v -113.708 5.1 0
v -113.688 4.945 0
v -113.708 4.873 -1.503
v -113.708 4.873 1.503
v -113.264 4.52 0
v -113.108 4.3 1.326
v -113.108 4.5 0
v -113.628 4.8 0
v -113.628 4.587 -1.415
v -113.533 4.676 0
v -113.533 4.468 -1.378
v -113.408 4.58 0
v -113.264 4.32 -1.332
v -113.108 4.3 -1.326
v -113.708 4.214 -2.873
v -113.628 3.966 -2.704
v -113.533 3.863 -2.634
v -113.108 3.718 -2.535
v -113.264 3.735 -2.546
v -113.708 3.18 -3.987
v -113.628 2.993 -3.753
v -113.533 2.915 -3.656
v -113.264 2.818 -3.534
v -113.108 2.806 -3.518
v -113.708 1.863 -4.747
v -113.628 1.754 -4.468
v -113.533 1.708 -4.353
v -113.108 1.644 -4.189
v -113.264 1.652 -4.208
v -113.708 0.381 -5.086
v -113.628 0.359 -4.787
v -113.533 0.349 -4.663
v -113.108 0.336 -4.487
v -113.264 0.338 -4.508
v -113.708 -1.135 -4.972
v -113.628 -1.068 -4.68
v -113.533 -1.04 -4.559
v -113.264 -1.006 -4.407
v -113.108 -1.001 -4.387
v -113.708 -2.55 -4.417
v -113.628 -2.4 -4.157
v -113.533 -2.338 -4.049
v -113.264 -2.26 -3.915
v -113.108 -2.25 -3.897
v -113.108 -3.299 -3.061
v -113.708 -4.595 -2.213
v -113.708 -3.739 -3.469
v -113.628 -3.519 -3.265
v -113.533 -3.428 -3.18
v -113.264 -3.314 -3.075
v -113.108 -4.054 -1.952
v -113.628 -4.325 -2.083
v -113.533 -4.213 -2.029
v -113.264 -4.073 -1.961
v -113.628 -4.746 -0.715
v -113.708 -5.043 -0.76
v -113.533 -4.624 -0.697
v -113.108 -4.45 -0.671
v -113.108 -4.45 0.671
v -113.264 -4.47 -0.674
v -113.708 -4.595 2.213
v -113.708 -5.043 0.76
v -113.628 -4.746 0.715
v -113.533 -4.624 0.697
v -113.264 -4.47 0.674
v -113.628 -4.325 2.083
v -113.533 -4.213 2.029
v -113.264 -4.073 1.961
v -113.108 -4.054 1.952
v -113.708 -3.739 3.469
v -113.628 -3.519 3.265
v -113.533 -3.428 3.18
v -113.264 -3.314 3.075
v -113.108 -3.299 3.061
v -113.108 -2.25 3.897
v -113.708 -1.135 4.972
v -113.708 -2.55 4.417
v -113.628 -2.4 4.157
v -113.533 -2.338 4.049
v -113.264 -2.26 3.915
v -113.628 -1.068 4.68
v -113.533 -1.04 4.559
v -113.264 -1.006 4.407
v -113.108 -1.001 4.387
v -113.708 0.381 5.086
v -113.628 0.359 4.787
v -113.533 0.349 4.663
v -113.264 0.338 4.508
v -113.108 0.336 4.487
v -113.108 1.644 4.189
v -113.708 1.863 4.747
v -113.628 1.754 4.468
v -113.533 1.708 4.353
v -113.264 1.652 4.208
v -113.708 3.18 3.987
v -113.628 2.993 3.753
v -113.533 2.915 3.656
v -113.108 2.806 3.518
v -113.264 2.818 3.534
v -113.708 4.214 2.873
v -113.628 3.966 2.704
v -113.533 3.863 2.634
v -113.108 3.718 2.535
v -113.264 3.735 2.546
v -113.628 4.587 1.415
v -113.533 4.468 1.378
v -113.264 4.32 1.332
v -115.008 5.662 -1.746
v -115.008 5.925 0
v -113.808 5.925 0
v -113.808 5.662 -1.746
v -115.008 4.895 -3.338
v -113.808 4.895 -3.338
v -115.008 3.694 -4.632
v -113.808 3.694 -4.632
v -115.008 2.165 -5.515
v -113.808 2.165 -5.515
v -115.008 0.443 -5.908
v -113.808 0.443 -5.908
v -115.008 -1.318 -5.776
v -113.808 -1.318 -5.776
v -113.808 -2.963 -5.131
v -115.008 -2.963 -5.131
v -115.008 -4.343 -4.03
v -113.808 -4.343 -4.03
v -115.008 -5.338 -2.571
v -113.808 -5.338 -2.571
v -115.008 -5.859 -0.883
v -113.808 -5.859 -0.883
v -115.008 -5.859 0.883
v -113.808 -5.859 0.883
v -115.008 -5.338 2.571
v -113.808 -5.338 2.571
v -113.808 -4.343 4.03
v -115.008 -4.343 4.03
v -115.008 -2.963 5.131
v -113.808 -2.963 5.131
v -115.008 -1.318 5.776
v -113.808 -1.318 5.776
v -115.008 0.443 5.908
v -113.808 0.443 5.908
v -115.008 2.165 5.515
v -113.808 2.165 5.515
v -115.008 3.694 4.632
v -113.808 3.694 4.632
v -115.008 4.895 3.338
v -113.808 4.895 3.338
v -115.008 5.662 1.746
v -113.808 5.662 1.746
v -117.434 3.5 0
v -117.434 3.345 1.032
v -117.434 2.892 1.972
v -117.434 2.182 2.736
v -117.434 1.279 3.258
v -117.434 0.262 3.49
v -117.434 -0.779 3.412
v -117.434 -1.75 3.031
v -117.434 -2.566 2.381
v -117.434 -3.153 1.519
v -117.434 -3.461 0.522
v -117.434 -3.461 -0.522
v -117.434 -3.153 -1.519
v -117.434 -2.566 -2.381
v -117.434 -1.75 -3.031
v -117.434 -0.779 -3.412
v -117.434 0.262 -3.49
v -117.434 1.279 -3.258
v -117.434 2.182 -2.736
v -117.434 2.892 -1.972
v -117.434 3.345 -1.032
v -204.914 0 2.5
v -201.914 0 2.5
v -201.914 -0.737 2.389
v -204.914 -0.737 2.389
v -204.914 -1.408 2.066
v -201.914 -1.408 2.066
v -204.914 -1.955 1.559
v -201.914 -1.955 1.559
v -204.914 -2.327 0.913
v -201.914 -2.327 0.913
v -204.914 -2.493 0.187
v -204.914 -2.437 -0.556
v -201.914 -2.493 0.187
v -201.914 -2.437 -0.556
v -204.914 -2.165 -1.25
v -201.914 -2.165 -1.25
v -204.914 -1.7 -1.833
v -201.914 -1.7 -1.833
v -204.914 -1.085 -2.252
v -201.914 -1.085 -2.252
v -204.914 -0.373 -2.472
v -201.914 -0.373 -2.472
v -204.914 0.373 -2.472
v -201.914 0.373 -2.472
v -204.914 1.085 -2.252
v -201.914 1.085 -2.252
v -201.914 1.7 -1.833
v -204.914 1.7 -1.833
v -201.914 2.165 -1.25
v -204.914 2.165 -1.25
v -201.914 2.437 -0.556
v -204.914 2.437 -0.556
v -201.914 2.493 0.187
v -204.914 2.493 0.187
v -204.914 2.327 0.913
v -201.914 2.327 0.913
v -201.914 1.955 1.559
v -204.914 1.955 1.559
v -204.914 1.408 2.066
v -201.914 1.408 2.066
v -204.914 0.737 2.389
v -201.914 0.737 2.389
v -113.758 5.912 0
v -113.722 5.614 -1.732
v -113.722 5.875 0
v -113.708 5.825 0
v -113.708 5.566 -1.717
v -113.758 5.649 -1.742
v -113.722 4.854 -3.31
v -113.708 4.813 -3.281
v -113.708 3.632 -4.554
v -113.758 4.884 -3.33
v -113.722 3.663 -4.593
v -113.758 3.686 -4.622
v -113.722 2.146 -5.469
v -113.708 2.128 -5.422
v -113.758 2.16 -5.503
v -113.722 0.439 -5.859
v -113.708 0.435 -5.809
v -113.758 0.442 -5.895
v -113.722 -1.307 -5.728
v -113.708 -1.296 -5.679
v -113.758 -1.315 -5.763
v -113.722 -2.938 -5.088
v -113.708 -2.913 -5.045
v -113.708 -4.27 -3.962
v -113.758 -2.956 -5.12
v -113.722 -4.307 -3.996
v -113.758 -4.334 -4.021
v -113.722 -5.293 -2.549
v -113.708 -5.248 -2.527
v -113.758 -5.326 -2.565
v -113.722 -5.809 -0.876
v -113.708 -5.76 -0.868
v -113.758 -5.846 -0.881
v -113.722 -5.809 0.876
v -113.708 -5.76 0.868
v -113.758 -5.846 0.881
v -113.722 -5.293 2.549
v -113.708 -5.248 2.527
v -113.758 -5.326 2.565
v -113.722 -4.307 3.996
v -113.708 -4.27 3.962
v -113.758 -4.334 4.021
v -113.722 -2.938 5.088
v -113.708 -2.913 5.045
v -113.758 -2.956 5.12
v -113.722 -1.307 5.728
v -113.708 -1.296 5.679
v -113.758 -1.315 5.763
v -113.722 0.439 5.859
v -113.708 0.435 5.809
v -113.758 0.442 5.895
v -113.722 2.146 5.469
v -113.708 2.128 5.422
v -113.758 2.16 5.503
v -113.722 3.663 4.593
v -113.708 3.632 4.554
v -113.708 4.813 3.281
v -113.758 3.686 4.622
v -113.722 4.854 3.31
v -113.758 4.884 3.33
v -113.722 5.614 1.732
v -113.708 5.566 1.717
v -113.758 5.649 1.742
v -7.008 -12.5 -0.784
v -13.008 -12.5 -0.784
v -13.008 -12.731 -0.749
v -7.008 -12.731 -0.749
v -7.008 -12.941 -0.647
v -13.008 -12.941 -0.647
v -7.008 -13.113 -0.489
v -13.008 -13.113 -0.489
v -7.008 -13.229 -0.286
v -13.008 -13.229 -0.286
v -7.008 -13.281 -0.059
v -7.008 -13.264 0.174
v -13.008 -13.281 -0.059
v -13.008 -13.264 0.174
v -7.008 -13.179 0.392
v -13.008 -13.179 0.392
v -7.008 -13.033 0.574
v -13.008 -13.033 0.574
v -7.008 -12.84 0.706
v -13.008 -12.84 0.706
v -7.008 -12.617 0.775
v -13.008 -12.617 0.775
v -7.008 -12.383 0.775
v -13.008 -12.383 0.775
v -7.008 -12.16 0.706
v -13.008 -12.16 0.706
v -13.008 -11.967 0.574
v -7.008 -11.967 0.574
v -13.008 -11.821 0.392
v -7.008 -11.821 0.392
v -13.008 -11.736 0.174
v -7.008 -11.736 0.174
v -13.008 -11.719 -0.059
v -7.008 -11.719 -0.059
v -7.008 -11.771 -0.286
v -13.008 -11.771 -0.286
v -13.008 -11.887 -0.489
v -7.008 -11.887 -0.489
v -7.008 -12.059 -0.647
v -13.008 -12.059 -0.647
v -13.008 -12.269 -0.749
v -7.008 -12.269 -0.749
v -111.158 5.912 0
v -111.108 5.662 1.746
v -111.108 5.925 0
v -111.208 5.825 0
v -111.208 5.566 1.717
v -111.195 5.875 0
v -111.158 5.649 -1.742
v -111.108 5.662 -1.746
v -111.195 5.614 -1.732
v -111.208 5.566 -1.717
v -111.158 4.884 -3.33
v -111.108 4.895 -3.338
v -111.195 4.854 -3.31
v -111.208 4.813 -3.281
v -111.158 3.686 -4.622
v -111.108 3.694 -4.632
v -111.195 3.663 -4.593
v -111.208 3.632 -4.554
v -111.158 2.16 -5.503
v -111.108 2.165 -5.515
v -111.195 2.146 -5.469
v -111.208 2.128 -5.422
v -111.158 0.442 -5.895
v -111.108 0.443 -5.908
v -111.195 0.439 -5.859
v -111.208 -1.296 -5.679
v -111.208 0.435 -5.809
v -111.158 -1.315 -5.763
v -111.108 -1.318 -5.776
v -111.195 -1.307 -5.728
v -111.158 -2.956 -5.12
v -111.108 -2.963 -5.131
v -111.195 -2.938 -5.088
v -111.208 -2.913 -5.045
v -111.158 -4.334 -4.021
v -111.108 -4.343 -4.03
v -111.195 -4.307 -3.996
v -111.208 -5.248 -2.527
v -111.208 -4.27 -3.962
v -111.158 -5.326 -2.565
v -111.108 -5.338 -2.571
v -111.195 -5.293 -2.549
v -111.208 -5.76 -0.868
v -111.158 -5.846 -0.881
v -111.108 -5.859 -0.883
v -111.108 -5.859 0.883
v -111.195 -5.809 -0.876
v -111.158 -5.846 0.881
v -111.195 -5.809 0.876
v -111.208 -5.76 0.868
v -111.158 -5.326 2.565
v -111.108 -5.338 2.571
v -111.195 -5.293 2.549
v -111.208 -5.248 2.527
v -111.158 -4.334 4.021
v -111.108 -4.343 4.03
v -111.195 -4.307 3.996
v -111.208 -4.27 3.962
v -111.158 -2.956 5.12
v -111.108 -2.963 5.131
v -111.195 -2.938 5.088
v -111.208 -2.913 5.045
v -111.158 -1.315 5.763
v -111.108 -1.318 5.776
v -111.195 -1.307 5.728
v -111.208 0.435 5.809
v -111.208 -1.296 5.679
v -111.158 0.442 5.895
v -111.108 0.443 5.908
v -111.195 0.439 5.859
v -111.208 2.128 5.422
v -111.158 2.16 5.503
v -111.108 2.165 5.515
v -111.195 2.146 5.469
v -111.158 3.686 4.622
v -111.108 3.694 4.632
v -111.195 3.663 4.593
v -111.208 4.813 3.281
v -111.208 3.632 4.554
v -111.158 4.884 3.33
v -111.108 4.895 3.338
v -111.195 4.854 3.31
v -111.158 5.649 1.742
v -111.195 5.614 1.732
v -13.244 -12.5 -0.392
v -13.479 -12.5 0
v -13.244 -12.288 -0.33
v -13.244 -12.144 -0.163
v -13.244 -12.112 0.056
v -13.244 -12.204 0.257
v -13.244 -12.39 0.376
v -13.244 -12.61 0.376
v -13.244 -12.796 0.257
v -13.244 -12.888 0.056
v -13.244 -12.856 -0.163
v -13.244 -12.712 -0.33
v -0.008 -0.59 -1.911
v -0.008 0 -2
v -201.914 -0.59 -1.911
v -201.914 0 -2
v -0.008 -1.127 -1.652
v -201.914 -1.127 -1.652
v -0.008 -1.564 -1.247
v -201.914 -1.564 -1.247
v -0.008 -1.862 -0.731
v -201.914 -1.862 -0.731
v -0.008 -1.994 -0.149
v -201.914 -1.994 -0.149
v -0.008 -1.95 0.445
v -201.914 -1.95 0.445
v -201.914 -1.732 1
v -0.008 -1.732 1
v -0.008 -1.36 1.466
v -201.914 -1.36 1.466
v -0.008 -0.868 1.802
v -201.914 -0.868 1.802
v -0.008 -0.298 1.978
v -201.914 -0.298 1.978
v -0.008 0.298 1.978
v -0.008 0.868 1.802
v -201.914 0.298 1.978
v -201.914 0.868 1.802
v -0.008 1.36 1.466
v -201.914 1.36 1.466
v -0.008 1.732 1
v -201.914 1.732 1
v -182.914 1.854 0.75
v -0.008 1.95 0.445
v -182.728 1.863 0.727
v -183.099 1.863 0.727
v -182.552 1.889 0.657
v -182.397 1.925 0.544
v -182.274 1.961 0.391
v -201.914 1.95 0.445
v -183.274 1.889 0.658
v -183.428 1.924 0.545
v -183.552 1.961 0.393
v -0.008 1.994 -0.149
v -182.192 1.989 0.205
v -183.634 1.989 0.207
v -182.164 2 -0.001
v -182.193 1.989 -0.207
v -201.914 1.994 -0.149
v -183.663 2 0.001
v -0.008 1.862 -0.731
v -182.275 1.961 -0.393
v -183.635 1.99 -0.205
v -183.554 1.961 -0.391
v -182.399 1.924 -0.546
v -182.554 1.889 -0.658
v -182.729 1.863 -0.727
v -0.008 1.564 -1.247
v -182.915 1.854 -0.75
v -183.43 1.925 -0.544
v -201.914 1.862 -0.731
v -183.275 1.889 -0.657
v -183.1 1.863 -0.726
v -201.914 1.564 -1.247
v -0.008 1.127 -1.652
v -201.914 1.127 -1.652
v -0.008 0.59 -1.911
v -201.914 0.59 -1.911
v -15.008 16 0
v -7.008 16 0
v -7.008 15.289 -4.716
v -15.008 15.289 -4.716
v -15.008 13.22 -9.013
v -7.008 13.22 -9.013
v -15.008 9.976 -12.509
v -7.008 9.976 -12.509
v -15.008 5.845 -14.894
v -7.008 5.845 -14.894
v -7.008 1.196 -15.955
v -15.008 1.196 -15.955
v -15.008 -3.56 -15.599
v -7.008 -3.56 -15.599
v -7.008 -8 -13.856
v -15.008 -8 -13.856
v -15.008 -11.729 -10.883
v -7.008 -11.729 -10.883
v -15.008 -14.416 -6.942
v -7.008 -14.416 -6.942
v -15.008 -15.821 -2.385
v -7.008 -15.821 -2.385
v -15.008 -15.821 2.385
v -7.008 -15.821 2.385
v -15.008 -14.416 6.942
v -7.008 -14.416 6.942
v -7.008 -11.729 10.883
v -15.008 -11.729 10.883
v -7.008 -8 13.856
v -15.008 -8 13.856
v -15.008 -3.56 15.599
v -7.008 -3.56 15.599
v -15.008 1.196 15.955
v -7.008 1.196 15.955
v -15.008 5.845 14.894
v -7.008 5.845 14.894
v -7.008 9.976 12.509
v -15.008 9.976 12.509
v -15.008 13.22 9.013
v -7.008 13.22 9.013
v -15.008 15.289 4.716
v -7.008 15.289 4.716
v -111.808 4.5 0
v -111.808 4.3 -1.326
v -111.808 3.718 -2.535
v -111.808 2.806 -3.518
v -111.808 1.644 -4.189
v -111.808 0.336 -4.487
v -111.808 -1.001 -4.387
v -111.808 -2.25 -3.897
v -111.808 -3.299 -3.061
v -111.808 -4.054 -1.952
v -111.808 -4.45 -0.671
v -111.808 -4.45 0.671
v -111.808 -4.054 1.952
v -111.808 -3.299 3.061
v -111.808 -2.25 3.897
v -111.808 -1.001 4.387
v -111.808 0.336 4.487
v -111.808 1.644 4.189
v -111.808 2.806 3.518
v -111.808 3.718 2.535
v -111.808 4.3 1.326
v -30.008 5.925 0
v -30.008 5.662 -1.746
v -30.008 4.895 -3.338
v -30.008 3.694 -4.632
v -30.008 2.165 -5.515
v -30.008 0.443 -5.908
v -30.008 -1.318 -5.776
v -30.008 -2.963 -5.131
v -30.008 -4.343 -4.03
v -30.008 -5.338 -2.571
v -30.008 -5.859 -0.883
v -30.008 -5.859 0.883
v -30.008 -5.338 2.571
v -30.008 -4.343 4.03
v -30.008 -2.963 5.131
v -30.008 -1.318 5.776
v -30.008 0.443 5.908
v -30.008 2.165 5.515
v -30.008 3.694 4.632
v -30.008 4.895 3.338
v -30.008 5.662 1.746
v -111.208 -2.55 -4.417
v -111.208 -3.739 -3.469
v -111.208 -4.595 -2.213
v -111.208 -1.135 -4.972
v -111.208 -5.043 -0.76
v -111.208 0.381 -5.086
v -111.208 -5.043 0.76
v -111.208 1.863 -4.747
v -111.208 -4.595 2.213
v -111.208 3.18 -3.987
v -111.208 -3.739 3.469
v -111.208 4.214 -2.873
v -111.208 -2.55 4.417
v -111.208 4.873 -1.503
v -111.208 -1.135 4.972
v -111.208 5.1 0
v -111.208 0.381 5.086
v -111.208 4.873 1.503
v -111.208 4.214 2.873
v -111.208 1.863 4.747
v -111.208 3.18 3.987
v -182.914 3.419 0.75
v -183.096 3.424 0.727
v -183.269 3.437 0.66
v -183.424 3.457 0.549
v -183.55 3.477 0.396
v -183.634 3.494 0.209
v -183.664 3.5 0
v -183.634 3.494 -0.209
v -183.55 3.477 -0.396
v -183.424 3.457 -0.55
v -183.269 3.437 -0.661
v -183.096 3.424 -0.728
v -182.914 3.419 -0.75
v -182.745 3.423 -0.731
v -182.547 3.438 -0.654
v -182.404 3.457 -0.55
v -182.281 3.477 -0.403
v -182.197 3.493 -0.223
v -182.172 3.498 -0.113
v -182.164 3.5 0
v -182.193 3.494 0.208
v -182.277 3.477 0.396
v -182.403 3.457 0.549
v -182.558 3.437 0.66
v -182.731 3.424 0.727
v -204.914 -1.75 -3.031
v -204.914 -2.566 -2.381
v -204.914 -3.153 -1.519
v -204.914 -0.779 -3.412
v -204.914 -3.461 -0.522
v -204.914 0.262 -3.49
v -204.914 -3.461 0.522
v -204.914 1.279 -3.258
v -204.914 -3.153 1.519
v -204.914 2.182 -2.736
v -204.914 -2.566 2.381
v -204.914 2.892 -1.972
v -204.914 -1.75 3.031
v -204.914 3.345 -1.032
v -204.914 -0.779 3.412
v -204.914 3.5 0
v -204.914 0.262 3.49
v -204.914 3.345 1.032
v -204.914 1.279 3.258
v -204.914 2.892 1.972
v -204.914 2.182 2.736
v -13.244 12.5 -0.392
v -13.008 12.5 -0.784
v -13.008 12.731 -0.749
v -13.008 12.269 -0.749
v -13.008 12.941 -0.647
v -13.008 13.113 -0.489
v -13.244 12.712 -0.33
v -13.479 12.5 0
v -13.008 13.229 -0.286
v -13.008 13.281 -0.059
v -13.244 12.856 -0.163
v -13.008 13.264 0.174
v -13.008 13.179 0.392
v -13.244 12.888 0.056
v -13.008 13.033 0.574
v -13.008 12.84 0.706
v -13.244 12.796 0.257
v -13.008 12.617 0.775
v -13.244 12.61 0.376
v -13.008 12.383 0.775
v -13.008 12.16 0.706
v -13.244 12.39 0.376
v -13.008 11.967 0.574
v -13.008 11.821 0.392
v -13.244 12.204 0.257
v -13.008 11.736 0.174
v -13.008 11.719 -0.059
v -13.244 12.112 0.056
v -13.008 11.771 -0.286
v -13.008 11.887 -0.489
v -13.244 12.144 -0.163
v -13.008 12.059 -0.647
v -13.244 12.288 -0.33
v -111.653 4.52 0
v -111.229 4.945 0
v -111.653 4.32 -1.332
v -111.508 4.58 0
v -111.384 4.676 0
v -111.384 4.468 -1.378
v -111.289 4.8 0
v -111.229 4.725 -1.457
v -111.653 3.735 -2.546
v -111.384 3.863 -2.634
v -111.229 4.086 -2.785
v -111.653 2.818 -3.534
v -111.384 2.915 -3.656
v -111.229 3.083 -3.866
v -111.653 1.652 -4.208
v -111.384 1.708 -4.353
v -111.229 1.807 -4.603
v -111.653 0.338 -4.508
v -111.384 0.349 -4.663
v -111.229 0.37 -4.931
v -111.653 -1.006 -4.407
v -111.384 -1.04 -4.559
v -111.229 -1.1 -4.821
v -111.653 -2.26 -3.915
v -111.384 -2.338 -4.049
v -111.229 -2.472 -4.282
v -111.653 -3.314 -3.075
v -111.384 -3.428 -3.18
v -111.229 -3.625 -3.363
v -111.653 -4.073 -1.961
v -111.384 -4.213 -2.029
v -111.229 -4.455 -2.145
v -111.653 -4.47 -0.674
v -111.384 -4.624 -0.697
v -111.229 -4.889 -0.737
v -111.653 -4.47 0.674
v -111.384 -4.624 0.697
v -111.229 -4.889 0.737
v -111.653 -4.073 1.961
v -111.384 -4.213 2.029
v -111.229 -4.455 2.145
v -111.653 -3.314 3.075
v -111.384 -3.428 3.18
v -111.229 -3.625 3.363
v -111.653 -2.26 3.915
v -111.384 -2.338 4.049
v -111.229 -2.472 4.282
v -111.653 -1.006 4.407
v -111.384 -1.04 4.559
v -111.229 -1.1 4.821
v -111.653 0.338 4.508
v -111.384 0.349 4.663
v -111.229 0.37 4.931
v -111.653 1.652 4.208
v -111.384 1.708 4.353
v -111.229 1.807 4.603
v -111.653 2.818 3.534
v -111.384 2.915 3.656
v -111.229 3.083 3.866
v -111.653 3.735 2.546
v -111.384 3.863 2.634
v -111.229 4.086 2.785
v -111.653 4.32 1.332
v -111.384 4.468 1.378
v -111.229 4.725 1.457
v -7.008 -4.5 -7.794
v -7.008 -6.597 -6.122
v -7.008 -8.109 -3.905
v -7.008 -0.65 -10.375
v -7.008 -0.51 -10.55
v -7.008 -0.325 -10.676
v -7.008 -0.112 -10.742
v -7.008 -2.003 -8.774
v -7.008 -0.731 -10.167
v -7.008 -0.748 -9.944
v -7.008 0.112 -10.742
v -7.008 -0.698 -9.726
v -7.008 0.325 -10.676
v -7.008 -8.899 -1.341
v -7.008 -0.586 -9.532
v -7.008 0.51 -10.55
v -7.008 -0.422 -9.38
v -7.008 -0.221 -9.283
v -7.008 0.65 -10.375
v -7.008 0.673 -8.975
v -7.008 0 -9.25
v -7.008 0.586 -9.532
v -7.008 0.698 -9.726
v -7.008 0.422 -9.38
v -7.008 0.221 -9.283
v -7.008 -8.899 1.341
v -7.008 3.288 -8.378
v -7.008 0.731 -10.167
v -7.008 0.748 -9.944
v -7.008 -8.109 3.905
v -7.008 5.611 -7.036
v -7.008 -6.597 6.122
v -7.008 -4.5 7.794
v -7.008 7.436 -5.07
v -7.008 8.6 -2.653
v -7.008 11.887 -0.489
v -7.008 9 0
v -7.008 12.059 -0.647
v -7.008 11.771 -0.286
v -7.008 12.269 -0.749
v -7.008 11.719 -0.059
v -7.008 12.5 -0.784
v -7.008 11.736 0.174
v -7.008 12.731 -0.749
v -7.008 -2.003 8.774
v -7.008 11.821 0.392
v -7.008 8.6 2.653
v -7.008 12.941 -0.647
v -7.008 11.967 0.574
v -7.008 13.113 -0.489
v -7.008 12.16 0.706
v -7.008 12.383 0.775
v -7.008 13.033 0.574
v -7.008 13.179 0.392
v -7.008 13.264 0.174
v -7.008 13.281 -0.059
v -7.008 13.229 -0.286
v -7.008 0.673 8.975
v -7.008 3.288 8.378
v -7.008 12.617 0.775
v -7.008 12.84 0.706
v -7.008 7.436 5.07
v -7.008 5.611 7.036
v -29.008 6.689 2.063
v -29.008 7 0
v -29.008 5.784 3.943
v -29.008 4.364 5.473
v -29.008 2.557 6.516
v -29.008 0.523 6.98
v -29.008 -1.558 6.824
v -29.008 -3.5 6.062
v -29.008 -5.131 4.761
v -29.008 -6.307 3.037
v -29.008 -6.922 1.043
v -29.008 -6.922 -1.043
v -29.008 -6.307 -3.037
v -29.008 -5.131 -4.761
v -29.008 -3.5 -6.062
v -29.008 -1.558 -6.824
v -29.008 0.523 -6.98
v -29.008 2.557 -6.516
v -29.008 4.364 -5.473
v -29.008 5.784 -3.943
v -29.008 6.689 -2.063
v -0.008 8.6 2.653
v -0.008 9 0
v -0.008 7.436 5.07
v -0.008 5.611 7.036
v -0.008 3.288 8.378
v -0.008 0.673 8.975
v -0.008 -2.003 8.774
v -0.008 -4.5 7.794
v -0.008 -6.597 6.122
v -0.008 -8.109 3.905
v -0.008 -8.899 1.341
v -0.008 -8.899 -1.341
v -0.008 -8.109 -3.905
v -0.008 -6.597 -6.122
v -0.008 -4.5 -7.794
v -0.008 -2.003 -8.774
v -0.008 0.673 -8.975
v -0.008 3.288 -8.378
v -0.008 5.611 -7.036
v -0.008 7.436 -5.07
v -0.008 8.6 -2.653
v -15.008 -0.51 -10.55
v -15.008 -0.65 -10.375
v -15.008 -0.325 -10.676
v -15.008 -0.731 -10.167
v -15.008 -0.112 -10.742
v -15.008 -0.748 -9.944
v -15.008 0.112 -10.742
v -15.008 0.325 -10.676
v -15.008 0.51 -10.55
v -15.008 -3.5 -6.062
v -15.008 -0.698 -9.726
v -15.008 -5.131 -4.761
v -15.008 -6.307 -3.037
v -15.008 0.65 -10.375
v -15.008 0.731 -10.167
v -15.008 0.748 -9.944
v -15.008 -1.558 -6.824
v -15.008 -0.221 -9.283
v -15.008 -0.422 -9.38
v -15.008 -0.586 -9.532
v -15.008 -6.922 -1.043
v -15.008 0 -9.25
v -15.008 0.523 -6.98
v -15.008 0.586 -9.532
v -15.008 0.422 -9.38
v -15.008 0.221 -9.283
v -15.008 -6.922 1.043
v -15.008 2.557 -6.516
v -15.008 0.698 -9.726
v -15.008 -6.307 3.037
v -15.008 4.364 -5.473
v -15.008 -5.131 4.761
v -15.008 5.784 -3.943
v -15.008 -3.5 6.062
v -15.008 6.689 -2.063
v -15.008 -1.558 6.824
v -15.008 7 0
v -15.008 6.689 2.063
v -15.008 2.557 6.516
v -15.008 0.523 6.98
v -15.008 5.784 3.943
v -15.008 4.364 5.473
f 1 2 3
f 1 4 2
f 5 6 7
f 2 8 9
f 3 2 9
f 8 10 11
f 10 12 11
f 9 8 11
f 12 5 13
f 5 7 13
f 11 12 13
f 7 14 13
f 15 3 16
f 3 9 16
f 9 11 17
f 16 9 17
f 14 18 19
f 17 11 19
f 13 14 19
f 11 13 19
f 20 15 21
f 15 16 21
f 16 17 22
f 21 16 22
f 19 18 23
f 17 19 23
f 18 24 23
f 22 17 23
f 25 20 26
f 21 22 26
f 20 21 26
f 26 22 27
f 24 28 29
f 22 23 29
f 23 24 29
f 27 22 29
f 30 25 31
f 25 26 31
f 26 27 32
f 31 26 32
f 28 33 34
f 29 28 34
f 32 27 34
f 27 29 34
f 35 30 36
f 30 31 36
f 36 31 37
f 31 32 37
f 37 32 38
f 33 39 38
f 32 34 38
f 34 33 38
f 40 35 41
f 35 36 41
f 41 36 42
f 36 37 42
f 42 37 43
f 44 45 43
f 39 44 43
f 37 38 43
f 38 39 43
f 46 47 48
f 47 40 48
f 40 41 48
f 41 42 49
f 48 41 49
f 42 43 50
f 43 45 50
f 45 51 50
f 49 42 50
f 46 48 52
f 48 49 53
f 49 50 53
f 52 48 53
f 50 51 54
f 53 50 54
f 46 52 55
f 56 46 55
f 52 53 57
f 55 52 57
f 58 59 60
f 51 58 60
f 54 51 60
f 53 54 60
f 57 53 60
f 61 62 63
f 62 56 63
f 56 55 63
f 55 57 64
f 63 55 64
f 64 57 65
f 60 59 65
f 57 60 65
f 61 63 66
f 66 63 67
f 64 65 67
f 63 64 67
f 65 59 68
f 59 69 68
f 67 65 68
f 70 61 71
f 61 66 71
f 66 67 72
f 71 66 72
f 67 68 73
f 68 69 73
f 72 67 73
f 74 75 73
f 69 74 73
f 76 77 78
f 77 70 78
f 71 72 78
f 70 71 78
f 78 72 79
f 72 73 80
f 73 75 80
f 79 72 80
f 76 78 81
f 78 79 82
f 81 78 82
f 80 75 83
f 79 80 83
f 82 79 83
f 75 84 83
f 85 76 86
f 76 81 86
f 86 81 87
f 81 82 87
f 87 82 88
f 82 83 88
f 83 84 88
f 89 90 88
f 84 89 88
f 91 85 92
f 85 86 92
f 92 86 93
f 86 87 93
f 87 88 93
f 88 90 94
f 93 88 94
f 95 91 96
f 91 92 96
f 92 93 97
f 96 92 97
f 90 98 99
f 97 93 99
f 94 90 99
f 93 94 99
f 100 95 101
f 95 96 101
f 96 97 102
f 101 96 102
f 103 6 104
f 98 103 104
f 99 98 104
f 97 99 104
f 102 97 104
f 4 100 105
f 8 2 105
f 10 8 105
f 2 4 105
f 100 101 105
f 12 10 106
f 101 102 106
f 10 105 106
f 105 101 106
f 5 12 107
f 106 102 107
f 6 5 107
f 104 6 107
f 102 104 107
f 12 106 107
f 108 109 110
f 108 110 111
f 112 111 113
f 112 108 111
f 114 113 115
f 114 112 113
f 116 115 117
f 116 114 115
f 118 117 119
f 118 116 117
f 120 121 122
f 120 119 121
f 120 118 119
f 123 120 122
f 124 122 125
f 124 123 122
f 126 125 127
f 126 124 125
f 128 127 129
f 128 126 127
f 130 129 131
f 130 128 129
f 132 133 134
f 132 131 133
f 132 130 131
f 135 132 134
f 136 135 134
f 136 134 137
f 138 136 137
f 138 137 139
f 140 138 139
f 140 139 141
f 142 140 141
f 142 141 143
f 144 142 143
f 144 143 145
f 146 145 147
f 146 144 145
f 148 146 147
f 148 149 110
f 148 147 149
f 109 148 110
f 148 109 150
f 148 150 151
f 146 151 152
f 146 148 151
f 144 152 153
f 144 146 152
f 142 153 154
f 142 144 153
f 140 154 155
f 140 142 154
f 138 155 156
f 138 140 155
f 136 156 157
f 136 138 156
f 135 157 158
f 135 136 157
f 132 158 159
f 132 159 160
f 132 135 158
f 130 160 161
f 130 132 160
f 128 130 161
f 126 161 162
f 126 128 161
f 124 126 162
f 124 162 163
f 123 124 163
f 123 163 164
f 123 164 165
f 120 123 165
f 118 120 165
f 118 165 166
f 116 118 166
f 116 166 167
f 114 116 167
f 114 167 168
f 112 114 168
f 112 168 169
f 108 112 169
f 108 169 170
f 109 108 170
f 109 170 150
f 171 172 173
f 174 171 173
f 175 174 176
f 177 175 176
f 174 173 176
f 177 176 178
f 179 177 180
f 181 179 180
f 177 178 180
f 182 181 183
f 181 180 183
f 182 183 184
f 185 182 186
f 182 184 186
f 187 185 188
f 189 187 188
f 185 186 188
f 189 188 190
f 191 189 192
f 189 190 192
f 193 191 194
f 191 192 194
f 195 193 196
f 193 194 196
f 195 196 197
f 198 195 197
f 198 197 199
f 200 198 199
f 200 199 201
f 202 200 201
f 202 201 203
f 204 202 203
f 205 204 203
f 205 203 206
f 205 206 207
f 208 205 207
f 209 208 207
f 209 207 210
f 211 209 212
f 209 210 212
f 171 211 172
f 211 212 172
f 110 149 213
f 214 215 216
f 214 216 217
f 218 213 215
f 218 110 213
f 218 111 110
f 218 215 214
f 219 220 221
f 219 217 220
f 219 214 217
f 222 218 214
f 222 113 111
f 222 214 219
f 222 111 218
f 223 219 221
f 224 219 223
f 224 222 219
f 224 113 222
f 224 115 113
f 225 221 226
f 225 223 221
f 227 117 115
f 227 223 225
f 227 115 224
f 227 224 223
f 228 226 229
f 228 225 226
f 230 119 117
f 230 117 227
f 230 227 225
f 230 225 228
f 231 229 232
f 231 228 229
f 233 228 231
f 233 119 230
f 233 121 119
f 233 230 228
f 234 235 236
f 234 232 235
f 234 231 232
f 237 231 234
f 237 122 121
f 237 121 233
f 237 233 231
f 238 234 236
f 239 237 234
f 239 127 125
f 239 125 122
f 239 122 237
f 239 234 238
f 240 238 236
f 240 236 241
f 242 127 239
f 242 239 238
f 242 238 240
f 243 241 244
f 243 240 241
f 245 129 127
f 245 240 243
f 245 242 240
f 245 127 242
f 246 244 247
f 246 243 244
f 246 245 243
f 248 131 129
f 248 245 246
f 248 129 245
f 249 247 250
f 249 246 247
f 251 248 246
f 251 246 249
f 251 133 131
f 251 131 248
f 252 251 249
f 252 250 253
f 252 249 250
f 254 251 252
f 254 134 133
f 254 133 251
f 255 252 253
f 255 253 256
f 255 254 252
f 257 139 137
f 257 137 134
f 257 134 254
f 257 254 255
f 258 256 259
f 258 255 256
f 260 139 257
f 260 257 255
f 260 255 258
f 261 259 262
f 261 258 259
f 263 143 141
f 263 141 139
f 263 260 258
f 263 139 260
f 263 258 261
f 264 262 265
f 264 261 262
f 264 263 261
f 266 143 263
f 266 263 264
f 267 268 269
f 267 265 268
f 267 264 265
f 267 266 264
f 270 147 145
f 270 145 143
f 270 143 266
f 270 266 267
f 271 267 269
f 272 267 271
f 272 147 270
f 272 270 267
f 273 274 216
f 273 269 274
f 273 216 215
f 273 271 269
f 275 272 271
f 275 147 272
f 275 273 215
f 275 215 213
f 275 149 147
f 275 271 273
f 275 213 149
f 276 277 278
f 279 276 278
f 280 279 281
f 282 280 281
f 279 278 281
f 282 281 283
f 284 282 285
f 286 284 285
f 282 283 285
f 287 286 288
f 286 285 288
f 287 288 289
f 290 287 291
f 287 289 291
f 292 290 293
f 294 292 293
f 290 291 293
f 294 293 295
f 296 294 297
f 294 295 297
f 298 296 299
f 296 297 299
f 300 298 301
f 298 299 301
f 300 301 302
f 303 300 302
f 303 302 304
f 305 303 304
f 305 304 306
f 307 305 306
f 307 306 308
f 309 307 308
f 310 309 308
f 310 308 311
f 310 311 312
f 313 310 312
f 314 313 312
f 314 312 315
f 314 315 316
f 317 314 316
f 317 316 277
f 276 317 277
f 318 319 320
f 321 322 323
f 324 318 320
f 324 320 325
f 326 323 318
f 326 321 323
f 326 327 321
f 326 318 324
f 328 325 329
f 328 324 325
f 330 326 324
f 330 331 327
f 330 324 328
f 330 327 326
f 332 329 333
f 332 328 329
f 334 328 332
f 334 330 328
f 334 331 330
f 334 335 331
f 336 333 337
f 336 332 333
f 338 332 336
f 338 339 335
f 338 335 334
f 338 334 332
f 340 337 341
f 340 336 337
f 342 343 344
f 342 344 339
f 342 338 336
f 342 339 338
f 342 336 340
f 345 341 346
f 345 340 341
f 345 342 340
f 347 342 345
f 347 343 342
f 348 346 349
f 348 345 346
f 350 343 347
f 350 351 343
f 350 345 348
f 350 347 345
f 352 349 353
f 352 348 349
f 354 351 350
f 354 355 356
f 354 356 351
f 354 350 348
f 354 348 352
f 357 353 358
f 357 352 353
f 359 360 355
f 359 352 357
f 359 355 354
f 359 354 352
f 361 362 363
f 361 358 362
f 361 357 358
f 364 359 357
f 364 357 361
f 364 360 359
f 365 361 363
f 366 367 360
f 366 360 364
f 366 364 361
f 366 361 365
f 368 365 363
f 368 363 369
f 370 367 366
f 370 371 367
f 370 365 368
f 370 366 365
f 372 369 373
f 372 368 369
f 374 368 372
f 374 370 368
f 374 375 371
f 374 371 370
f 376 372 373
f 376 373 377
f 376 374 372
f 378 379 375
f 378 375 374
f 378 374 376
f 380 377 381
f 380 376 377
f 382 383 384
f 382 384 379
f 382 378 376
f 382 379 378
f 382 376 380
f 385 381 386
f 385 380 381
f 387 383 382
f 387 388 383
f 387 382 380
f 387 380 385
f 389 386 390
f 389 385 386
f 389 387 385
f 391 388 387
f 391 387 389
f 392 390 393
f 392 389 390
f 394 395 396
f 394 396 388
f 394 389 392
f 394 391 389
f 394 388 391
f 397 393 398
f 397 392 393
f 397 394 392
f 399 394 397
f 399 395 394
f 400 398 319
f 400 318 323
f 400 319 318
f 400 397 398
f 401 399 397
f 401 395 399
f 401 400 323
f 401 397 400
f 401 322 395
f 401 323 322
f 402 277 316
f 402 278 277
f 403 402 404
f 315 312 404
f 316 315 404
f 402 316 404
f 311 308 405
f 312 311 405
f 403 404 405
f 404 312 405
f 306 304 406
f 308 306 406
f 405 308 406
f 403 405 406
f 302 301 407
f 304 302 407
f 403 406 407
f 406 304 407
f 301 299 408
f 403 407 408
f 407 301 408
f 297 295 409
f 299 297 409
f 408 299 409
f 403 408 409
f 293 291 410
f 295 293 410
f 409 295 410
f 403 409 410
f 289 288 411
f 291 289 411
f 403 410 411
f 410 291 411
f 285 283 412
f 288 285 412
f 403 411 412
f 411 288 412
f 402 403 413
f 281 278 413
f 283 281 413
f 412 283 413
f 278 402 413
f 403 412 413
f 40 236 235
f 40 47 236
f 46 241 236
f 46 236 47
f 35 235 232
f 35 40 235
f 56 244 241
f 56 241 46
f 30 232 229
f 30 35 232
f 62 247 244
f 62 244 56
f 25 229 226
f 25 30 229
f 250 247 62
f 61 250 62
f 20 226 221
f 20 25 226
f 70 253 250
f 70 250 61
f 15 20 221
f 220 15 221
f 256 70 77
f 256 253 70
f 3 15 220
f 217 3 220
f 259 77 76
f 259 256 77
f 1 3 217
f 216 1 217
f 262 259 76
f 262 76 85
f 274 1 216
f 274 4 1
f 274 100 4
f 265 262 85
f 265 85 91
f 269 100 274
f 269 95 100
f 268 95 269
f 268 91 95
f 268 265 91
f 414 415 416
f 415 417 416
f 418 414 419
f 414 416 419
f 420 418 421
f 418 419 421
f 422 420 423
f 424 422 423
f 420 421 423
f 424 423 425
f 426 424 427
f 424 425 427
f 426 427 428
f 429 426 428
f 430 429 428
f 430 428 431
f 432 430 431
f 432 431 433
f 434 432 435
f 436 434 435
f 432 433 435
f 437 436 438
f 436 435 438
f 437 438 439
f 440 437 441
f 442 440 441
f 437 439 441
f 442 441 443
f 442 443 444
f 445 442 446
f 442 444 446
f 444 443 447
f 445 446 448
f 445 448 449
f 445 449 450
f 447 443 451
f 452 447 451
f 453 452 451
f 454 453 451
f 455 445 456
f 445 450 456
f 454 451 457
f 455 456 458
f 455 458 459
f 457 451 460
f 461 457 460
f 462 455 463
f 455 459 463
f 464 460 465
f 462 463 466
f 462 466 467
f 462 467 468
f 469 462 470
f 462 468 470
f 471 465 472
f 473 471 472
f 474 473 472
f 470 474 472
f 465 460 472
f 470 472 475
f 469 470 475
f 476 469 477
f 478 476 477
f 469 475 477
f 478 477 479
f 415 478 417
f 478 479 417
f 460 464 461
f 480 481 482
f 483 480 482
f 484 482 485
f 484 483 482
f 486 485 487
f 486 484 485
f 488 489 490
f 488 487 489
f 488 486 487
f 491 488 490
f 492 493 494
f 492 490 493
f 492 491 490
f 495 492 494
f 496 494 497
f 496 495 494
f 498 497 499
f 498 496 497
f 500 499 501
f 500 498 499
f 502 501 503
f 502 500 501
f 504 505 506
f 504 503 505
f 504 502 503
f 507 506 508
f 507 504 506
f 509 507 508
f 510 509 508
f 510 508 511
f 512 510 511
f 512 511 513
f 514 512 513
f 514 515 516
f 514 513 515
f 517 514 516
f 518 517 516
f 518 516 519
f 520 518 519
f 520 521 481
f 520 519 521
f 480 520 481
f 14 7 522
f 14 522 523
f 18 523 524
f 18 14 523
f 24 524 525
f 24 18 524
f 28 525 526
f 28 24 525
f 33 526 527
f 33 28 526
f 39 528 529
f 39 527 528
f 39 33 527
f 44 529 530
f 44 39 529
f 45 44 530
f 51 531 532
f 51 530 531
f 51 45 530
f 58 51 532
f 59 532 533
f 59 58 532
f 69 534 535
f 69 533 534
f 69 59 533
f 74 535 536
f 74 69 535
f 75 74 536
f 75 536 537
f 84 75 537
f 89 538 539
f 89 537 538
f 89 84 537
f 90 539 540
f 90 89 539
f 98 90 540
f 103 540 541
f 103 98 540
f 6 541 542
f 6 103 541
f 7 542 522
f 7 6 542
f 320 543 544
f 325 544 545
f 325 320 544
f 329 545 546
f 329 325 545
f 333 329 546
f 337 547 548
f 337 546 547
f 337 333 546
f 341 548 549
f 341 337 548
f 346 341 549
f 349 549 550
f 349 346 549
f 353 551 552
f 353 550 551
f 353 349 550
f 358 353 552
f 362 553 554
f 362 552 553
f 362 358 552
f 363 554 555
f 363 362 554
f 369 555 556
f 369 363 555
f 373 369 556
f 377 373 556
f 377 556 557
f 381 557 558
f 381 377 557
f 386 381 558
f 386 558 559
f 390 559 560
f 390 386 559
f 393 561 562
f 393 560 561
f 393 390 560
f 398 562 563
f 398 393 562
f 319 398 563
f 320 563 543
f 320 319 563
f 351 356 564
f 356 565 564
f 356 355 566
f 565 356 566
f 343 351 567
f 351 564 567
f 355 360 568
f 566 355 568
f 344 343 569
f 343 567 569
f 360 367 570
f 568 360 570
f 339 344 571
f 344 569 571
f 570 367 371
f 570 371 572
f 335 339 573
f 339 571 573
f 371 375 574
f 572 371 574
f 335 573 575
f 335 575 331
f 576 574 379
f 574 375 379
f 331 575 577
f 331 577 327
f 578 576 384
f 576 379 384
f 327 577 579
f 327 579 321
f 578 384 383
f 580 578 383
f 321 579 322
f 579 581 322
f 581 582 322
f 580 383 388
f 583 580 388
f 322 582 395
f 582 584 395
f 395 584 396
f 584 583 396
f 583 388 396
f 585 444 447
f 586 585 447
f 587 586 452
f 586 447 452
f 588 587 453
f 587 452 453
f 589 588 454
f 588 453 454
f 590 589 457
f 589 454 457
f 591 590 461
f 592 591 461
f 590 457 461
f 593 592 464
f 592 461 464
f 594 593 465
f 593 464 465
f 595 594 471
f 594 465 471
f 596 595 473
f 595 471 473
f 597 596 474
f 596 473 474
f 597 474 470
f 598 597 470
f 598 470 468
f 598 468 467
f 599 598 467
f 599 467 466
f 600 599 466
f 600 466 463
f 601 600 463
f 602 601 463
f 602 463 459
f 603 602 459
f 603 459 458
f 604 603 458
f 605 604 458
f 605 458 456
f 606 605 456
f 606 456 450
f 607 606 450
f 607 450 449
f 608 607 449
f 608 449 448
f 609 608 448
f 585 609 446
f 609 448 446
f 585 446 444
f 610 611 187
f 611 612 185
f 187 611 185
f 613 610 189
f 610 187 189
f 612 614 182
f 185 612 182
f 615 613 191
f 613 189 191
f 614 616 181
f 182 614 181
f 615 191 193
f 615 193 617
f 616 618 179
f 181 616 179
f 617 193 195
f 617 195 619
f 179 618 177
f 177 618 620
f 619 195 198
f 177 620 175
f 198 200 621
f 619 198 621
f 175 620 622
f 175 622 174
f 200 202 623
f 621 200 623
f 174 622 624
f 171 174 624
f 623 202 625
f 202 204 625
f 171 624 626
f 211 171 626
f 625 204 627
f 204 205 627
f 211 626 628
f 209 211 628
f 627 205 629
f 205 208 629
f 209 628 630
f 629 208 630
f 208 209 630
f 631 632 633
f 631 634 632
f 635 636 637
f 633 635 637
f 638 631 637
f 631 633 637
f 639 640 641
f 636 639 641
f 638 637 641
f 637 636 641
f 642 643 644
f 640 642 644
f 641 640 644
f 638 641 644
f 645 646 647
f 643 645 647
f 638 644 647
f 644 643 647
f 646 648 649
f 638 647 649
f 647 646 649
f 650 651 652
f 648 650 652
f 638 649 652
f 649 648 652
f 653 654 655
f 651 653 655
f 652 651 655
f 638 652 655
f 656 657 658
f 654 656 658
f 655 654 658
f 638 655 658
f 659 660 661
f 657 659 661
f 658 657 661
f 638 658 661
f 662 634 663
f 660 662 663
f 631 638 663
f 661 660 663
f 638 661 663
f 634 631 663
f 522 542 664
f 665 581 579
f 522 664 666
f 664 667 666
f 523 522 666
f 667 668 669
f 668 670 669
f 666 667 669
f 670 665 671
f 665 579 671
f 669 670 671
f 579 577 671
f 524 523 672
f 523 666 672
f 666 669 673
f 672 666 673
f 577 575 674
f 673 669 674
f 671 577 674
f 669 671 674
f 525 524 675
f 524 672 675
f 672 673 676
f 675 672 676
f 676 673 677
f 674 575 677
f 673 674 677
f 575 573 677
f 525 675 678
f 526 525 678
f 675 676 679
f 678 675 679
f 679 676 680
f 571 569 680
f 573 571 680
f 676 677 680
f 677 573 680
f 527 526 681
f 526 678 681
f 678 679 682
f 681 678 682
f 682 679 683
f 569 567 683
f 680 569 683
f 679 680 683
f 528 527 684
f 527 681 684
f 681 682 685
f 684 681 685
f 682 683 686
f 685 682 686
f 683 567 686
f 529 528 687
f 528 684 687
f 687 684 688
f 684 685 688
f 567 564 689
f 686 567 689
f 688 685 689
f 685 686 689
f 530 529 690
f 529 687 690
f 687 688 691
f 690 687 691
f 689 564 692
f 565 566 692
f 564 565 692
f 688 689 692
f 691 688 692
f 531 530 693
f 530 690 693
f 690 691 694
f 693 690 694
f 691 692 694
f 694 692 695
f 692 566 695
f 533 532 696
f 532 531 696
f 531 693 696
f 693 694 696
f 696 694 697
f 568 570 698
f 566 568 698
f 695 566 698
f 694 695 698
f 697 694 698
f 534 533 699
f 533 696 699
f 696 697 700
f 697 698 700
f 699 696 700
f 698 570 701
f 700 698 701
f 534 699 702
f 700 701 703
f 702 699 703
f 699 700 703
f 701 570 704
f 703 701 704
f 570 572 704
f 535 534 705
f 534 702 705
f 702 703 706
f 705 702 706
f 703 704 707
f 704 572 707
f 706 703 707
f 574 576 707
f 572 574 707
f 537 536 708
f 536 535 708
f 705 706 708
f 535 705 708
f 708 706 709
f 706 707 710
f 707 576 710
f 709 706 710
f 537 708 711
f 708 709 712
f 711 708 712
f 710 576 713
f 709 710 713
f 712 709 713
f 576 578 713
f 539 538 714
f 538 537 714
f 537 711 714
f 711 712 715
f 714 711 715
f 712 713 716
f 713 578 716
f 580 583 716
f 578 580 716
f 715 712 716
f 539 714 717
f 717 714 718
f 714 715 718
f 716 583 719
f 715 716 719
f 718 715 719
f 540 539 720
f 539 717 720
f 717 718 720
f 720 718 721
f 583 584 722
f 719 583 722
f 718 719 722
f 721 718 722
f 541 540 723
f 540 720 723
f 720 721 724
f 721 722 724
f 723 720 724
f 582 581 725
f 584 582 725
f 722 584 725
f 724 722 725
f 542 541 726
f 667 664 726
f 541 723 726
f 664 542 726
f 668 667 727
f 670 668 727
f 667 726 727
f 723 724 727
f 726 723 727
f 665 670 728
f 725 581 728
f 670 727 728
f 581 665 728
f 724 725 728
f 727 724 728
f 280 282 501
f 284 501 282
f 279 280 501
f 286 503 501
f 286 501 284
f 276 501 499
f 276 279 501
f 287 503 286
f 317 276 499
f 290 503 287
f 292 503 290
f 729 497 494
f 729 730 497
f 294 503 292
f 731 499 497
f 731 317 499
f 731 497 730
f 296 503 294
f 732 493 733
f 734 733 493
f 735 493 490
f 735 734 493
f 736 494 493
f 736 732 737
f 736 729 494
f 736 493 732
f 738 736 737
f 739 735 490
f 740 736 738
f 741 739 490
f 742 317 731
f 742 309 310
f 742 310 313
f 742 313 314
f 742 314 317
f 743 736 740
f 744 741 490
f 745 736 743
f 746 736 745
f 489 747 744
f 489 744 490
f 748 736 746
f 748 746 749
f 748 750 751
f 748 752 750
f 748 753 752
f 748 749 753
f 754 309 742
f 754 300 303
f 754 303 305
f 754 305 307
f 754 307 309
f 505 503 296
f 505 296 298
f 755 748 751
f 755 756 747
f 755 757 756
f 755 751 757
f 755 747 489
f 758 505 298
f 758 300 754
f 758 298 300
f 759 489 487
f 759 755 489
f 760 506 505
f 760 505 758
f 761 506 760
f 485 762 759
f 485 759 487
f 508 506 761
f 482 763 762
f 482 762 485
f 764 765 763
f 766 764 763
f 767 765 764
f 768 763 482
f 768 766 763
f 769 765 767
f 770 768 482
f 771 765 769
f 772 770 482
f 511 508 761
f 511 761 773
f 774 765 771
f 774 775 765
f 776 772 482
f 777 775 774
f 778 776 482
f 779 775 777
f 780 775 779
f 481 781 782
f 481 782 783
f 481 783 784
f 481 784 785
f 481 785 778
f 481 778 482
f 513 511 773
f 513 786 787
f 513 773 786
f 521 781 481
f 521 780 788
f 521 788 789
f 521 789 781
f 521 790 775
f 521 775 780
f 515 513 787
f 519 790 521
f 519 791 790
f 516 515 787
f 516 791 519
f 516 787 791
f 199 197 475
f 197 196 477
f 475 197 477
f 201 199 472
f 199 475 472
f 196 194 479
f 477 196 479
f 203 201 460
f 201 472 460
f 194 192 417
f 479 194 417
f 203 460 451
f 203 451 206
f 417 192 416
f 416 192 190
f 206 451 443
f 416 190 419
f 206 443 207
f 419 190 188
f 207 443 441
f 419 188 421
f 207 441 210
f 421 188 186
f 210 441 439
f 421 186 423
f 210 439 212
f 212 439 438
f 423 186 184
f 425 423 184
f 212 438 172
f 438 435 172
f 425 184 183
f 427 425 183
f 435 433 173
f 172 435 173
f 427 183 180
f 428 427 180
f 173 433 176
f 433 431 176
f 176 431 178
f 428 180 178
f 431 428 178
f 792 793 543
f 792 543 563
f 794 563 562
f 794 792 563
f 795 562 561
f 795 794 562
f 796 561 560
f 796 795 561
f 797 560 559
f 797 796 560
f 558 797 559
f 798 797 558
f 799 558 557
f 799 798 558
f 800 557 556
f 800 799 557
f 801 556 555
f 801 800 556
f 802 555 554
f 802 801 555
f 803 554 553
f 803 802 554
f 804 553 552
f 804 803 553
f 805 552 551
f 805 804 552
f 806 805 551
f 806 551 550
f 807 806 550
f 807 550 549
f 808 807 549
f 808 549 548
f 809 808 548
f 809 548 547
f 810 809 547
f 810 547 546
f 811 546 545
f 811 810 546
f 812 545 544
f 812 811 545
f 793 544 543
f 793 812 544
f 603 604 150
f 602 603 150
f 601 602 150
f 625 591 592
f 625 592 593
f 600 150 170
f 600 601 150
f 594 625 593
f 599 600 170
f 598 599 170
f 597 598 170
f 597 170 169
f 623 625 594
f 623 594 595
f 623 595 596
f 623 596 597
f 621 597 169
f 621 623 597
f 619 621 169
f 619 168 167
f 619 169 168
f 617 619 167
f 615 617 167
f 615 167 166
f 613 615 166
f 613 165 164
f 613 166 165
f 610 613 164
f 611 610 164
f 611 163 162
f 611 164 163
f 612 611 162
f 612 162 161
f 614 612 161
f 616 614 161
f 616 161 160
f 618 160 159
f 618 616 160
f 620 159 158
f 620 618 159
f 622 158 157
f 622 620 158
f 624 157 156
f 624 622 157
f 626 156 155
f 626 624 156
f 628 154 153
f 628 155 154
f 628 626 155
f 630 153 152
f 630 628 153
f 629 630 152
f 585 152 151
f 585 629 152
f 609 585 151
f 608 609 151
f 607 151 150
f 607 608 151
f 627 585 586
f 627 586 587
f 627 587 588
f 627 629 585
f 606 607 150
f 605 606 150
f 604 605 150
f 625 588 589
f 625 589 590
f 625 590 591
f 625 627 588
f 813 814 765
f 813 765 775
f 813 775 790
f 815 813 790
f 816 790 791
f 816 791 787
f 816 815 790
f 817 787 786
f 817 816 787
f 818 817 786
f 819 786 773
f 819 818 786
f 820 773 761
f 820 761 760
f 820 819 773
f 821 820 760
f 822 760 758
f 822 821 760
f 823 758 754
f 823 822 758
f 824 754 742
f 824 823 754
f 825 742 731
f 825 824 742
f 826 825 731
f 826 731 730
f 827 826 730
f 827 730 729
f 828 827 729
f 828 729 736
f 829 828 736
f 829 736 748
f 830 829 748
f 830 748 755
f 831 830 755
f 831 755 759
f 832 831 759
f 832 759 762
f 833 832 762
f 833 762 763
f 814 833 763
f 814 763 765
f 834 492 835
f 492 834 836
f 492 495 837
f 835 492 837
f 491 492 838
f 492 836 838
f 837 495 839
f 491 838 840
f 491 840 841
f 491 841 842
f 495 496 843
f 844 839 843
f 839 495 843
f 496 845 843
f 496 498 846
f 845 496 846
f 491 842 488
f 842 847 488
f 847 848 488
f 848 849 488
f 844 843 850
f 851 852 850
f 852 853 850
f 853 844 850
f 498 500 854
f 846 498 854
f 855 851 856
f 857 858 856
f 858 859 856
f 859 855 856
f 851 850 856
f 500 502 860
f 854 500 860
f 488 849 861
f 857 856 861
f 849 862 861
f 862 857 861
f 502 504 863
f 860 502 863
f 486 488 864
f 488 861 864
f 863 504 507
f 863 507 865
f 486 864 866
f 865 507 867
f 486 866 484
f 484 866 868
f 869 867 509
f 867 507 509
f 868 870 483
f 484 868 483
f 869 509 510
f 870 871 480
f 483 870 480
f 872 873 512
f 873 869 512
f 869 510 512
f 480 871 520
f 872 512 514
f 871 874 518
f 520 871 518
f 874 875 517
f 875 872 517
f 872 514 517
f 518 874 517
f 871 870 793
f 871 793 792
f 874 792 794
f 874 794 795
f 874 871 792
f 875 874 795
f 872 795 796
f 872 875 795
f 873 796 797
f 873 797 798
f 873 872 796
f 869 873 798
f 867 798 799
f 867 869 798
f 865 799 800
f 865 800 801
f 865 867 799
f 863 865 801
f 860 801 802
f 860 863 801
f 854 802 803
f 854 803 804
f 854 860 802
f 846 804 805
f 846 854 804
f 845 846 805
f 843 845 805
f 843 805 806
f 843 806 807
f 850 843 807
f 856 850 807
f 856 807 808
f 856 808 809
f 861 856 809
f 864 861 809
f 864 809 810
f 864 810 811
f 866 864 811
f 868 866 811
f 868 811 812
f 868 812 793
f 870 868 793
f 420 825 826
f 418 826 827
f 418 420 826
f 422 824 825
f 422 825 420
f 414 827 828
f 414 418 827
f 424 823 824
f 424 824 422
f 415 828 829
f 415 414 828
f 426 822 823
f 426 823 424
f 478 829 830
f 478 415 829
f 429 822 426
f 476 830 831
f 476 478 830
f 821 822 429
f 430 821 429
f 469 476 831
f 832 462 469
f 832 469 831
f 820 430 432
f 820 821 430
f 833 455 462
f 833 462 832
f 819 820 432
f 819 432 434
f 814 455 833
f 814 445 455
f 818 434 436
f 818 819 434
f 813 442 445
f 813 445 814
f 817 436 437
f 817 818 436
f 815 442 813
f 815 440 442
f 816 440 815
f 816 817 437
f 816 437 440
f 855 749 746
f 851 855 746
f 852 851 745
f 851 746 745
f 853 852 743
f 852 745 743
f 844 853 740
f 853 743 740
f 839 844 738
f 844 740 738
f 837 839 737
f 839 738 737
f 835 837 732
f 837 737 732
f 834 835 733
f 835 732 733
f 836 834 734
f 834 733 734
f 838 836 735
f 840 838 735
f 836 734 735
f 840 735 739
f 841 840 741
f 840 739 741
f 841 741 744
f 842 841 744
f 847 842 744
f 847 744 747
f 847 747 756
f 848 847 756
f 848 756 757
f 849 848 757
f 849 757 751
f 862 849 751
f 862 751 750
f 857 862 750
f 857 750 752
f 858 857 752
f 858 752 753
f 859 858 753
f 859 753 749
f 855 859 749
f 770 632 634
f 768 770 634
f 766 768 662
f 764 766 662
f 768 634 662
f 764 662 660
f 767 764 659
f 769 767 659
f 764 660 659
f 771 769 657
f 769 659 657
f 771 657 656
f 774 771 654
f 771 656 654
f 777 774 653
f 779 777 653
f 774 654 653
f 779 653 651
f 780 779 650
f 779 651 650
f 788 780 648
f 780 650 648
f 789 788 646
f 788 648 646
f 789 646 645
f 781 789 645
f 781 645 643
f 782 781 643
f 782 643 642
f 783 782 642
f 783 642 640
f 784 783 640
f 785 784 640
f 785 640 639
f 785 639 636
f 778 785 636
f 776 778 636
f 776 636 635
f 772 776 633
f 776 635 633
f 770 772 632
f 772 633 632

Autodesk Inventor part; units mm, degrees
ref_plane "YZ Plane" through (0, 0, 0) normal (1, 0, 0) x (0, 1, 0)
ref_plane "XZ Plane" through (0, 0, 0) normal (0, 1, 0) x (-1, 0, 0)
ref_plane "XY Plane" through (0, 0, 0) normal (0, 0, 1) x (1, 0, 0)
sketch "Skizze1" plane through (0, 0, 0) normal (0, 0, 1) x (1, 0, 0)
  line L0 (-0.0085, 0) -> (-0.0085, 9)
  line L1 (-7.0085, 16) -> (-15.0085, 16)
  line L2 (-15.0085, 16) -> (-15.0085, 7)
  line L3 (-30.0085, 5.925) -> (-111.1085, 5.925)
  line L4 (-113.8085, 5.925) -> (-115.0085, 5.925)
  line L5 (-115.0085, 5.925) -> (-117.4335, 3.5)
  line L6 (-117.4335, 3.5) -> (-204.9135, 3.5)
  line L7 (-204.9135, 3.5) -> (-204.9135, 0)
  line L8 (-222.883, 3.2454) -> (-222.883, 3.2454)
  line L9 (-222.883, 3.2454) -> (-222.883, 3.2454)
  line L10 (-204.9135, 0) -> (-0.0085, 0)
  line L11 (-111.8085, 4.5) -> (-113.1085, 4.5)
  line L12 (-30.0085, 5.925) -> (-29.0085, 7)
  line L13 (-29.0085, 7) -> (-15.0085, 7)
  line L14 (-113.7085, 5.1) -> (-113.7085, 5.825)
  line L15 (-111.2085, 5.1) -> (-111.2085, 5.825)
  arc A0 (-113.7085, 5.1) -> (-113.1085, 4.5) centre (-113.1085, 5.1) ccw
  arc A1 (-111.8085, 4.5) -> (-111.2085, 5.1) centre (-111.8085, 5.1) ccw
  arc A2 (-111.1085, 5.925) -> (-111.2085, 5.825) centre (-111.1085, 5.825) ccw
  arc A3 (-113.7085, 5.825) -> (-113.8085, 5.925) centre (-113.8085, 5.825) ccw
  line L16 (-7.0085, 16) -> (-7.0085, 9)
  line L17 (-7.0085, 9) -> (-0.0085, 9)
  point P0 (-111.2085, 5.925)
  point P1 (-113.7085, 5.925)
  point P2 (-111.2085, 4.5)
  point P3 (-113.7085, 4.5)
  dimension "d19" = 14
  dimension "d20" = 15
  dimension "d21" = 7
  dimension "d22" = 5.925
  dimension "d23" = 4.5
  dimension "d24" = 3.5
  dimension "d26" = 47.07
  dimension "d27" = 45
  dimension "d33" = 2.5
  dimension "d34" = 1.3
  dimension "d35" = 87.48
  dimension "d44" = 0.6
  dimension "d45" = 0.1
  dimension "d127" = 16
  dimension "d128" = 8
  dimension "d129" = 7
  dimension "d130" = 9
  dimension "d152" = 189.905
  dimension "d153" = 174.905
  dimension "d154" = 111.2
  dimension "d156" = 81.2
  dimension "d157" = 2.425
revolve "Drehung2" add sketch "Skizze1" angle 360 about axis through (-204.9135, 0, 0) along (1, 0, 0)
ref_plane "Arbeitsebene1" through (-161.1735, 3.5, 0) normal (0, 1, 0) x (-1, 0, 0)
sketch "Skizze3" plane through (-161.1735, 3.5, 0) normal (0, 1, 0) x (-1, 0, 0)
  line L0 (-43.74, 3.5) -> (-43.74, -3.5) projected
  line L1 (43.74, 3.5) -> (43.74, -3.5) projected
  line L2 (43.74, 3.5) -> (-43.74, 3.5) projected
  line L3 (43.74, -3.5) -> (-43.74, -3.5) projected
  line L4 (-222.6365, 0) -> (64.2305, 0) projected
  point P0 (21.74, 0)
  dimension "d158" = 65.48
  dimension "d166" = 22
hole "Bohrung1" at (-182.9135, 3.5, 0) direction (0, -1, 0) diameter 1.5 depth 3.5
hole "Bohrung2" at (-0.0085, 0, 0) direction (-1, 0, 0) diameter 4 depth 223
sketch "Skizze4" plane through (-15.0085, 0, 0) normal (-1, 0, 0) x (0, 0, 1)
  circle A0 centre (0, 0) radius 16 projected
  circle A1 centre (0, 0) radius 16 projected
  circle A2 centre (0, 0) radius 7 projected
  circle A3 centre (0, 0) radius 7 projected
  line L0 (0, -19.2) -> (0, 25.6) projected
  circle A4 centre (0, 0) radius 9 projected
  point P0 (-10, 0)
  point P1 (0, 11.7051)
  dimension "d132" = 90
  dimension "d148" = 10
hole "Bohrung3" at (-15.0085, 0, -10) direction (1, 0, 0) diameter 1.5 depth 8
sketch "Skizze17" plane through (-7.0085, 0, 0) normal (1, 0, 0) x (0, 0, -1)
  circle A0 centre (0, 0) radius 16 projected
  line L0 (0, -19.2) -> (0, 25.6) projected
  circle A1 centre (0, 0) radius 9 projected
  point P0 (0, 12.5)
  point P1 (0, -12.5)
  point P2 (0, 9)
  point P3 (0, 16)
  point P4 (0, -16)
  point P5 (0, -9)
  dimension "d135" = 7
  dimension "d136" = 3.5
  dimension "d137" = 3.5
  dimension "d145" = 12.5
hole "Bohrung10" at (-7.0085, -12.5, 0) at (-7.0085, 12.5, 0) direction (-1, 0, 0) diameter 1.567 depth 6 tip angle 118 thread size "M2x0.4" class "6H" standard "ANSI Metrisches M Profil"
sketch "Skizze19" plane through (-204.9135, 0, 0) normal (-1, 0, 0) x (0, 0, 1)
  circle A0 centre (0, 0) radius 2 projected
hole "Bohrung11" at (-204.9135, 0, 0) direction (1, 0, 0) diameter 5 depth 3
equation "\"d136\" = 0.5 * d135"
equation "\"d137\" = d136"
properties part number "Halter02"
